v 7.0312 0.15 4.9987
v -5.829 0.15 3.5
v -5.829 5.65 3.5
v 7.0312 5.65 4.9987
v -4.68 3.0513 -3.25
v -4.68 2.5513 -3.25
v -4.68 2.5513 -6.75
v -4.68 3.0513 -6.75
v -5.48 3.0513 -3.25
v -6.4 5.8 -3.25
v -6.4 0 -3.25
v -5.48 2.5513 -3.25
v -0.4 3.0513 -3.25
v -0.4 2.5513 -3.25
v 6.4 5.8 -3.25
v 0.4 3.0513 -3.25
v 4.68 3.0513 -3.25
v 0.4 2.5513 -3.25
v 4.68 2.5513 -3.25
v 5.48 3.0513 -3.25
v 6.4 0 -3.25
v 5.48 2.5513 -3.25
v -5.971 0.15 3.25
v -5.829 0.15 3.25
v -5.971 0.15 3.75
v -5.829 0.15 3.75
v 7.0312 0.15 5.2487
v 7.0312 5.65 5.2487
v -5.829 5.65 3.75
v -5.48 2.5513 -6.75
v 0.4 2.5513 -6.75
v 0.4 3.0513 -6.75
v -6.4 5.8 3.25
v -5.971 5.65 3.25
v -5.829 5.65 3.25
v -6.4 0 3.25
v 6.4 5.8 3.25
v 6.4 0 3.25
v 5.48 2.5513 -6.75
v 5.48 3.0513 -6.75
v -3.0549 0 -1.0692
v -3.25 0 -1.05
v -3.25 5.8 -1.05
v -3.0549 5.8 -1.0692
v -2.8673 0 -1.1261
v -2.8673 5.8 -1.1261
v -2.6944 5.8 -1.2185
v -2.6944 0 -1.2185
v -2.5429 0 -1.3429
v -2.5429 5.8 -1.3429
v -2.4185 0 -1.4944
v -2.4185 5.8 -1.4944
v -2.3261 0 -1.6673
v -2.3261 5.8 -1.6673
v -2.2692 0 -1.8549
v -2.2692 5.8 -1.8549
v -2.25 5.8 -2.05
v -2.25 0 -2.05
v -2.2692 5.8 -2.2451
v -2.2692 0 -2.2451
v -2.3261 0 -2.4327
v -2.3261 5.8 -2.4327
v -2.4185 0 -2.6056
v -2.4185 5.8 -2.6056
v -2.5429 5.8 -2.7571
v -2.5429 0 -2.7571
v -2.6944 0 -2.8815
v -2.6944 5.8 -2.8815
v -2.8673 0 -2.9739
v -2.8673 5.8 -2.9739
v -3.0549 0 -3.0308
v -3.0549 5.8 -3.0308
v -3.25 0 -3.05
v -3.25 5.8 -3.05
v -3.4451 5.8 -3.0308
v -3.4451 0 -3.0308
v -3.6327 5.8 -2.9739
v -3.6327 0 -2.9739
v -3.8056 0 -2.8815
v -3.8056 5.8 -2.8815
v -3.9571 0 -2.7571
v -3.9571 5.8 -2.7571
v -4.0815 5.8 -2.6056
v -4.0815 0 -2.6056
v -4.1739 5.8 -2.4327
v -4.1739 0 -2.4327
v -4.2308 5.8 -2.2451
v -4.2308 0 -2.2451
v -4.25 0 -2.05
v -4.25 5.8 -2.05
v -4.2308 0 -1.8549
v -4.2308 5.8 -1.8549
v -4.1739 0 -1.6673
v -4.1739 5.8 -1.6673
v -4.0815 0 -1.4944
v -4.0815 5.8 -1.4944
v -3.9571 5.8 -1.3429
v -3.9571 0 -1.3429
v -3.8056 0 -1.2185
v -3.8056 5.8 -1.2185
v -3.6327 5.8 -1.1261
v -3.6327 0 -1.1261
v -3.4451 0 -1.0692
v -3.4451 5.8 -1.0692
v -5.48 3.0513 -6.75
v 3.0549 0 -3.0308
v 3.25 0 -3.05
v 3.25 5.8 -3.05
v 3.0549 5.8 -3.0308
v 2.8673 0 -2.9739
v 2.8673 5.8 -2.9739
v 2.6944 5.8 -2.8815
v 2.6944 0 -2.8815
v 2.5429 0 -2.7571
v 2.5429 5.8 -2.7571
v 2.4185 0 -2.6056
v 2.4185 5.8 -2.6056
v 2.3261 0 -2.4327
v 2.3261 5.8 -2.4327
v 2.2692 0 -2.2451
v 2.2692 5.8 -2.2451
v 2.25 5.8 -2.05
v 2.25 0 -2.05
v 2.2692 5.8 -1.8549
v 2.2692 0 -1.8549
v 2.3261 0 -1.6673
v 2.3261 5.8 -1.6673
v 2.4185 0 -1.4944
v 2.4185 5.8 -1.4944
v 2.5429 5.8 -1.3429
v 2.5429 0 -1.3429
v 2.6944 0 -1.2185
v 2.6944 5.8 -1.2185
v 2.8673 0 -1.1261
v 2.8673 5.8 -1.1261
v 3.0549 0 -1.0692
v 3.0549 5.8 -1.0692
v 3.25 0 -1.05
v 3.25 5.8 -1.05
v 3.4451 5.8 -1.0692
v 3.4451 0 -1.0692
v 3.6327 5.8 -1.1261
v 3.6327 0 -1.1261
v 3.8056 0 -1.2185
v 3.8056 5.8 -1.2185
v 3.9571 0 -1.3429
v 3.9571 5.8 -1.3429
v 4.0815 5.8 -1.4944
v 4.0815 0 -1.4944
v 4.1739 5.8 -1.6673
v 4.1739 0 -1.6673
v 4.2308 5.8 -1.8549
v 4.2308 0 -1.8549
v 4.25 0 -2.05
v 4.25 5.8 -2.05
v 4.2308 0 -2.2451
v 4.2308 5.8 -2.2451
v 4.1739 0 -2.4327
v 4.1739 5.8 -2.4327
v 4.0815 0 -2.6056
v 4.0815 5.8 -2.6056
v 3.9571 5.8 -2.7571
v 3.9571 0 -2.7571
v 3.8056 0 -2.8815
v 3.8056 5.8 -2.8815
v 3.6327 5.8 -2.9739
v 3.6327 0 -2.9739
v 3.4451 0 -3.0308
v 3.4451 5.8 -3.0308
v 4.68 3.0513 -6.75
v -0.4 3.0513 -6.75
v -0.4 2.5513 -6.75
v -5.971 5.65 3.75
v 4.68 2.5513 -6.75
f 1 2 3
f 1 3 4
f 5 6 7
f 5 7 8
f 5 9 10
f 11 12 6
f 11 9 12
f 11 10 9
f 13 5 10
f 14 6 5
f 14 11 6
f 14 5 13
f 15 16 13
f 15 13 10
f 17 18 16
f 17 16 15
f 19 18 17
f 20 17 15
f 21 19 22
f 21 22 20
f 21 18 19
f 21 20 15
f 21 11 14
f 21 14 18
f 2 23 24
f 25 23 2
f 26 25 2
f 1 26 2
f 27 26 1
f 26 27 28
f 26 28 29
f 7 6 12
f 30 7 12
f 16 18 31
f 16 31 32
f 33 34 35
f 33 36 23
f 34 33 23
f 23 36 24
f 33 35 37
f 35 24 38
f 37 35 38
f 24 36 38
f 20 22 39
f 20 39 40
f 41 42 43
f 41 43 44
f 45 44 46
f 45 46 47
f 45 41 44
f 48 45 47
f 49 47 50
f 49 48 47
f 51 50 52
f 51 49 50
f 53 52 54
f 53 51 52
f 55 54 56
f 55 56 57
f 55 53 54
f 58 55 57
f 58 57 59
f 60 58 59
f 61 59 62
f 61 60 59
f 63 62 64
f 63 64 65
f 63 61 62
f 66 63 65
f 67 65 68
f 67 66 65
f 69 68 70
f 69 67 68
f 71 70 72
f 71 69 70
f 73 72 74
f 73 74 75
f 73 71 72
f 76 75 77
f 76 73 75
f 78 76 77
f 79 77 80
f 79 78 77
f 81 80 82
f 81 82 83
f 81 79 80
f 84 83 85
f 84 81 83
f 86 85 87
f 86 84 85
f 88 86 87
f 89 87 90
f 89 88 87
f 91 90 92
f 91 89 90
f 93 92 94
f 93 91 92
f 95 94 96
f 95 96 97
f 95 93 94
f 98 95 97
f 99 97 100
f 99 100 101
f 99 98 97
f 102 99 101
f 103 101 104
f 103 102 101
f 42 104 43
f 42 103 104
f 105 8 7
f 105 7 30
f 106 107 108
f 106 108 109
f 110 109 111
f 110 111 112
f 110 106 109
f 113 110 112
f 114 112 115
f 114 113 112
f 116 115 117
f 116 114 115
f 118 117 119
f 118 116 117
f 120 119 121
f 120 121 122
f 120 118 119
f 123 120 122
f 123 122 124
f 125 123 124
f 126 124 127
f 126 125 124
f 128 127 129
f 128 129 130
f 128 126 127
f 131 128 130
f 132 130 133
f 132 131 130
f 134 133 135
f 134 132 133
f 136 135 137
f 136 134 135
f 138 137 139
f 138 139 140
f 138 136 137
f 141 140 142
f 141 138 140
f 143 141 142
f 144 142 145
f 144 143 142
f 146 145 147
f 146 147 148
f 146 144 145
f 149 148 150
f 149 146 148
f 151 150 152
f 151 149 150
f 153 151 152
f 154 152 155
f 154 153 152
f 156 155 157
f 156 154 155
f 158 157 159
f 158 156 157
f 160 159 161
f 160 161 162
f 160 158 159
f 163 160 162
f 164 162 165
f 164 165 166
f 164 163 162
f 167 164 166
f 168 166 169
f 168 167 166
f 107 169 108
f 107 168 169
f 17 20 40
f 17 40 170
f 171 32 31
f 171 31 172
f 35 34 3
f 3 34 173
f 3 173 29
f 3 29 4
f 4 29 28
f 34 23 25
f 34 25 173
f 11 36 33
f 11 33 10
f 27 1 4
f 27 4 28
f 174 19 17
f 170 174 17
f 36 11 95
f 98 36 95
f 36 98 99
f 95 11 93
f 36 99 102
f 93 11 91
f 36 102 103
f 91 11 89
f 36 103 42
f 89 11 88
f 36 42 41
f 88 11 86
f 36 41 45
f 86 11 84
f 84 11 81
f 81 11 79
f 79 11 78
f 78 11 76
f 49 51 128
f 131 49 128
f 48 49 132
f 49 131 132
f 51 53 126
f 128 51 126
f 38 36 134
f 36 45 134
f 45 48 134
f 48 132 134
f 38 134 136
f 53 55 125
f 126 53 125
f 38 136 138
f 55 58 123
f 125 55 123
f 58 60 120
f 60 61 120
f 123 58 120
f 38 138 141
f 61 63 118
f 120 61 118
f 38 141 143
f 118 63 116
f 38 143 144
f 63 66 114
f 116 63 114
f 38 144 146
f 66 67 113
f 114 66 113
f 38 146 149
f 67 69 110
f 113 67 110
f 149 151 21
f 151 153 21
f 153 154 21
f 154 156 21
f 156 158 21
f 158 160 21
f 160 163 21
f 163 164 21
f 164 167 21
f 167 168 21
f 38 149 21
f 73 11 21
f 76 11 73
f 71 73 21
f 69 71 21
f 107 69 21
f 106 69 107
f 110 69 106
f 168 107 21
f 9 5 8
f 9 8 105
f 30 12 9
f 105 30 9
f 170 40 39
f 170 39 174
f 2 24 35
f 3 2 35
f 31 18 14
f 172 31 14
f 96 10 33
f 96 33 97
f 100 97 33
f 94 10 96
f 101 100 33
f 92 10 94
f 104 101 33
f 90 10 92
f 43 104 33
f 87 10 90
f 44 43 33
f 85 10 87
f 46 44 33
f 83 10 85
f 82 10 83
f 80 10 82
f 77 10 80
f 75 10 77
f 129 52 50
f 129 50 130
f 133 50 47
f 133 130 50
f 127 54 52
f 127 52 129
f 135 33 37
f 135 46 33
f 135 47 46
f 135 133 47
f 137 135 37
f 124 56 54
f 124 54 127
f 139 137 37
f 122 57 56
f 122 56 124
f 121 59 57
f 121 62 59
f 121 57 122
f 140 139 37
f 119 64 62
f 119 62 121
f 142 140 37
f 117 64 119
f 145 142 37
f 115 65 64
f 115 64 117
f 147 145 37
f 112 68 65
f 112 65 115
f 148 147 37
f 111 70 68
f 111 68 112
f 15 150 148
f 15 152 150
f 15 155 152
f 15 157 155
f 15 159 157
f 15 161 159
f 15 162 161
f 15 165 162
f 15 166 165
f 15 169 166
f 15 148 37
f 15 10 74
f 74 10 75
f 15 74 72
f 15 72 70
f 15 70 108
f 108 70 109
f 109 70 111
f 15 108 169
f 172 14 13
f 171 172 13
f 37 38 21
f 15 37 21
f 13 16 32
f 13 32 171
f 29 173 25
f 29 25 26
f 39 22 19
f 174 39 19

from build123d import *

# Parameters (mm, degrees)
SKETCH_1_W      = 12.8
SKETCH_1_H      = 6.5
SKETCH_1_R      = 1
EXTRUDE_1_DEPTH = 5.8
SKETCH_2_W      = 0.8
SKETCH_2_H      = 0.5
EXTRUDE_2_DEPTH = 3.5
SKETCH_4_W      = 0.142011972
SKETCH_4_H      = 5.5
EXTRUDE_4_DEPTH = 0.5
EXTRUDE_5_DEPTH = 5.5


with BuildPart() as part:
    # 草图1 → 凸台-拉伸1 (new body)
    with BuildSketch(Plane(origin=(0, 0, 0), x_dir=(1, 0, 0), z_dir=(0, 1, 0))):
        Rectangle(SKETCH_1_W, SKETCH_1_H)
        with Locations(Location((-3.25, 2.05, 0), (0, 0, 270))):
            Circle(SKETCH_1_R, mode=Mode.SUBTRACT)
        with Locations(Location((3.25, 2.05, 0), (0, 0, 90))):
            Circle(SKETCH_1_R, mode=Mode.SUBTRACT)
    extrude(amount=EXTRUDE_1_DEPTH)

    # 草图2 → 凸台-拉伸2 (add)
    with BuildSketch(Plane(origin=(0, 0, -3.25), x_dir=(-1, 0, 0), z_dir=(0, 0, -1))):
        with Locations((0, 2.801277115)):
            Rectangle(SKETCH_2_W, SKETCH_2_H)
        with Locations((5.08, 2.801277115)):
            Rectangle(SKETCH_2_W, SKETCH_2_H)
        with Locations((-5.08, 2.801277115)):
            Rectangle(SKETCH_2_W, SKETCH_2_H)
    extrude(amount=EXTRUDE_2_DEPTH)

    # 草图4 → 凸台-拉伸4 (add)
    with BuildSketch(Plane.XY.offset(3.25)):
        with Locations((-5.9, 2.9)):
            Rectangle(SKETCH_4_W, SKETCH_4_H)
    extrude(amount=EXTRUDE_4_DEPTH)

    # 草图6 → 凸台-拉伸5 (add)
    with BuildSketch(Plane.XZ.offset(-0.15)):
        Polygon((-5.828994014, 3.75), (-5.828994014, 3.5), (7.03115002, 4.998700306), (7.03115002, 5.248700306), align=None)
    extrude(amount=-EXTRUDE_5_DEPTH)


solid = part.part
